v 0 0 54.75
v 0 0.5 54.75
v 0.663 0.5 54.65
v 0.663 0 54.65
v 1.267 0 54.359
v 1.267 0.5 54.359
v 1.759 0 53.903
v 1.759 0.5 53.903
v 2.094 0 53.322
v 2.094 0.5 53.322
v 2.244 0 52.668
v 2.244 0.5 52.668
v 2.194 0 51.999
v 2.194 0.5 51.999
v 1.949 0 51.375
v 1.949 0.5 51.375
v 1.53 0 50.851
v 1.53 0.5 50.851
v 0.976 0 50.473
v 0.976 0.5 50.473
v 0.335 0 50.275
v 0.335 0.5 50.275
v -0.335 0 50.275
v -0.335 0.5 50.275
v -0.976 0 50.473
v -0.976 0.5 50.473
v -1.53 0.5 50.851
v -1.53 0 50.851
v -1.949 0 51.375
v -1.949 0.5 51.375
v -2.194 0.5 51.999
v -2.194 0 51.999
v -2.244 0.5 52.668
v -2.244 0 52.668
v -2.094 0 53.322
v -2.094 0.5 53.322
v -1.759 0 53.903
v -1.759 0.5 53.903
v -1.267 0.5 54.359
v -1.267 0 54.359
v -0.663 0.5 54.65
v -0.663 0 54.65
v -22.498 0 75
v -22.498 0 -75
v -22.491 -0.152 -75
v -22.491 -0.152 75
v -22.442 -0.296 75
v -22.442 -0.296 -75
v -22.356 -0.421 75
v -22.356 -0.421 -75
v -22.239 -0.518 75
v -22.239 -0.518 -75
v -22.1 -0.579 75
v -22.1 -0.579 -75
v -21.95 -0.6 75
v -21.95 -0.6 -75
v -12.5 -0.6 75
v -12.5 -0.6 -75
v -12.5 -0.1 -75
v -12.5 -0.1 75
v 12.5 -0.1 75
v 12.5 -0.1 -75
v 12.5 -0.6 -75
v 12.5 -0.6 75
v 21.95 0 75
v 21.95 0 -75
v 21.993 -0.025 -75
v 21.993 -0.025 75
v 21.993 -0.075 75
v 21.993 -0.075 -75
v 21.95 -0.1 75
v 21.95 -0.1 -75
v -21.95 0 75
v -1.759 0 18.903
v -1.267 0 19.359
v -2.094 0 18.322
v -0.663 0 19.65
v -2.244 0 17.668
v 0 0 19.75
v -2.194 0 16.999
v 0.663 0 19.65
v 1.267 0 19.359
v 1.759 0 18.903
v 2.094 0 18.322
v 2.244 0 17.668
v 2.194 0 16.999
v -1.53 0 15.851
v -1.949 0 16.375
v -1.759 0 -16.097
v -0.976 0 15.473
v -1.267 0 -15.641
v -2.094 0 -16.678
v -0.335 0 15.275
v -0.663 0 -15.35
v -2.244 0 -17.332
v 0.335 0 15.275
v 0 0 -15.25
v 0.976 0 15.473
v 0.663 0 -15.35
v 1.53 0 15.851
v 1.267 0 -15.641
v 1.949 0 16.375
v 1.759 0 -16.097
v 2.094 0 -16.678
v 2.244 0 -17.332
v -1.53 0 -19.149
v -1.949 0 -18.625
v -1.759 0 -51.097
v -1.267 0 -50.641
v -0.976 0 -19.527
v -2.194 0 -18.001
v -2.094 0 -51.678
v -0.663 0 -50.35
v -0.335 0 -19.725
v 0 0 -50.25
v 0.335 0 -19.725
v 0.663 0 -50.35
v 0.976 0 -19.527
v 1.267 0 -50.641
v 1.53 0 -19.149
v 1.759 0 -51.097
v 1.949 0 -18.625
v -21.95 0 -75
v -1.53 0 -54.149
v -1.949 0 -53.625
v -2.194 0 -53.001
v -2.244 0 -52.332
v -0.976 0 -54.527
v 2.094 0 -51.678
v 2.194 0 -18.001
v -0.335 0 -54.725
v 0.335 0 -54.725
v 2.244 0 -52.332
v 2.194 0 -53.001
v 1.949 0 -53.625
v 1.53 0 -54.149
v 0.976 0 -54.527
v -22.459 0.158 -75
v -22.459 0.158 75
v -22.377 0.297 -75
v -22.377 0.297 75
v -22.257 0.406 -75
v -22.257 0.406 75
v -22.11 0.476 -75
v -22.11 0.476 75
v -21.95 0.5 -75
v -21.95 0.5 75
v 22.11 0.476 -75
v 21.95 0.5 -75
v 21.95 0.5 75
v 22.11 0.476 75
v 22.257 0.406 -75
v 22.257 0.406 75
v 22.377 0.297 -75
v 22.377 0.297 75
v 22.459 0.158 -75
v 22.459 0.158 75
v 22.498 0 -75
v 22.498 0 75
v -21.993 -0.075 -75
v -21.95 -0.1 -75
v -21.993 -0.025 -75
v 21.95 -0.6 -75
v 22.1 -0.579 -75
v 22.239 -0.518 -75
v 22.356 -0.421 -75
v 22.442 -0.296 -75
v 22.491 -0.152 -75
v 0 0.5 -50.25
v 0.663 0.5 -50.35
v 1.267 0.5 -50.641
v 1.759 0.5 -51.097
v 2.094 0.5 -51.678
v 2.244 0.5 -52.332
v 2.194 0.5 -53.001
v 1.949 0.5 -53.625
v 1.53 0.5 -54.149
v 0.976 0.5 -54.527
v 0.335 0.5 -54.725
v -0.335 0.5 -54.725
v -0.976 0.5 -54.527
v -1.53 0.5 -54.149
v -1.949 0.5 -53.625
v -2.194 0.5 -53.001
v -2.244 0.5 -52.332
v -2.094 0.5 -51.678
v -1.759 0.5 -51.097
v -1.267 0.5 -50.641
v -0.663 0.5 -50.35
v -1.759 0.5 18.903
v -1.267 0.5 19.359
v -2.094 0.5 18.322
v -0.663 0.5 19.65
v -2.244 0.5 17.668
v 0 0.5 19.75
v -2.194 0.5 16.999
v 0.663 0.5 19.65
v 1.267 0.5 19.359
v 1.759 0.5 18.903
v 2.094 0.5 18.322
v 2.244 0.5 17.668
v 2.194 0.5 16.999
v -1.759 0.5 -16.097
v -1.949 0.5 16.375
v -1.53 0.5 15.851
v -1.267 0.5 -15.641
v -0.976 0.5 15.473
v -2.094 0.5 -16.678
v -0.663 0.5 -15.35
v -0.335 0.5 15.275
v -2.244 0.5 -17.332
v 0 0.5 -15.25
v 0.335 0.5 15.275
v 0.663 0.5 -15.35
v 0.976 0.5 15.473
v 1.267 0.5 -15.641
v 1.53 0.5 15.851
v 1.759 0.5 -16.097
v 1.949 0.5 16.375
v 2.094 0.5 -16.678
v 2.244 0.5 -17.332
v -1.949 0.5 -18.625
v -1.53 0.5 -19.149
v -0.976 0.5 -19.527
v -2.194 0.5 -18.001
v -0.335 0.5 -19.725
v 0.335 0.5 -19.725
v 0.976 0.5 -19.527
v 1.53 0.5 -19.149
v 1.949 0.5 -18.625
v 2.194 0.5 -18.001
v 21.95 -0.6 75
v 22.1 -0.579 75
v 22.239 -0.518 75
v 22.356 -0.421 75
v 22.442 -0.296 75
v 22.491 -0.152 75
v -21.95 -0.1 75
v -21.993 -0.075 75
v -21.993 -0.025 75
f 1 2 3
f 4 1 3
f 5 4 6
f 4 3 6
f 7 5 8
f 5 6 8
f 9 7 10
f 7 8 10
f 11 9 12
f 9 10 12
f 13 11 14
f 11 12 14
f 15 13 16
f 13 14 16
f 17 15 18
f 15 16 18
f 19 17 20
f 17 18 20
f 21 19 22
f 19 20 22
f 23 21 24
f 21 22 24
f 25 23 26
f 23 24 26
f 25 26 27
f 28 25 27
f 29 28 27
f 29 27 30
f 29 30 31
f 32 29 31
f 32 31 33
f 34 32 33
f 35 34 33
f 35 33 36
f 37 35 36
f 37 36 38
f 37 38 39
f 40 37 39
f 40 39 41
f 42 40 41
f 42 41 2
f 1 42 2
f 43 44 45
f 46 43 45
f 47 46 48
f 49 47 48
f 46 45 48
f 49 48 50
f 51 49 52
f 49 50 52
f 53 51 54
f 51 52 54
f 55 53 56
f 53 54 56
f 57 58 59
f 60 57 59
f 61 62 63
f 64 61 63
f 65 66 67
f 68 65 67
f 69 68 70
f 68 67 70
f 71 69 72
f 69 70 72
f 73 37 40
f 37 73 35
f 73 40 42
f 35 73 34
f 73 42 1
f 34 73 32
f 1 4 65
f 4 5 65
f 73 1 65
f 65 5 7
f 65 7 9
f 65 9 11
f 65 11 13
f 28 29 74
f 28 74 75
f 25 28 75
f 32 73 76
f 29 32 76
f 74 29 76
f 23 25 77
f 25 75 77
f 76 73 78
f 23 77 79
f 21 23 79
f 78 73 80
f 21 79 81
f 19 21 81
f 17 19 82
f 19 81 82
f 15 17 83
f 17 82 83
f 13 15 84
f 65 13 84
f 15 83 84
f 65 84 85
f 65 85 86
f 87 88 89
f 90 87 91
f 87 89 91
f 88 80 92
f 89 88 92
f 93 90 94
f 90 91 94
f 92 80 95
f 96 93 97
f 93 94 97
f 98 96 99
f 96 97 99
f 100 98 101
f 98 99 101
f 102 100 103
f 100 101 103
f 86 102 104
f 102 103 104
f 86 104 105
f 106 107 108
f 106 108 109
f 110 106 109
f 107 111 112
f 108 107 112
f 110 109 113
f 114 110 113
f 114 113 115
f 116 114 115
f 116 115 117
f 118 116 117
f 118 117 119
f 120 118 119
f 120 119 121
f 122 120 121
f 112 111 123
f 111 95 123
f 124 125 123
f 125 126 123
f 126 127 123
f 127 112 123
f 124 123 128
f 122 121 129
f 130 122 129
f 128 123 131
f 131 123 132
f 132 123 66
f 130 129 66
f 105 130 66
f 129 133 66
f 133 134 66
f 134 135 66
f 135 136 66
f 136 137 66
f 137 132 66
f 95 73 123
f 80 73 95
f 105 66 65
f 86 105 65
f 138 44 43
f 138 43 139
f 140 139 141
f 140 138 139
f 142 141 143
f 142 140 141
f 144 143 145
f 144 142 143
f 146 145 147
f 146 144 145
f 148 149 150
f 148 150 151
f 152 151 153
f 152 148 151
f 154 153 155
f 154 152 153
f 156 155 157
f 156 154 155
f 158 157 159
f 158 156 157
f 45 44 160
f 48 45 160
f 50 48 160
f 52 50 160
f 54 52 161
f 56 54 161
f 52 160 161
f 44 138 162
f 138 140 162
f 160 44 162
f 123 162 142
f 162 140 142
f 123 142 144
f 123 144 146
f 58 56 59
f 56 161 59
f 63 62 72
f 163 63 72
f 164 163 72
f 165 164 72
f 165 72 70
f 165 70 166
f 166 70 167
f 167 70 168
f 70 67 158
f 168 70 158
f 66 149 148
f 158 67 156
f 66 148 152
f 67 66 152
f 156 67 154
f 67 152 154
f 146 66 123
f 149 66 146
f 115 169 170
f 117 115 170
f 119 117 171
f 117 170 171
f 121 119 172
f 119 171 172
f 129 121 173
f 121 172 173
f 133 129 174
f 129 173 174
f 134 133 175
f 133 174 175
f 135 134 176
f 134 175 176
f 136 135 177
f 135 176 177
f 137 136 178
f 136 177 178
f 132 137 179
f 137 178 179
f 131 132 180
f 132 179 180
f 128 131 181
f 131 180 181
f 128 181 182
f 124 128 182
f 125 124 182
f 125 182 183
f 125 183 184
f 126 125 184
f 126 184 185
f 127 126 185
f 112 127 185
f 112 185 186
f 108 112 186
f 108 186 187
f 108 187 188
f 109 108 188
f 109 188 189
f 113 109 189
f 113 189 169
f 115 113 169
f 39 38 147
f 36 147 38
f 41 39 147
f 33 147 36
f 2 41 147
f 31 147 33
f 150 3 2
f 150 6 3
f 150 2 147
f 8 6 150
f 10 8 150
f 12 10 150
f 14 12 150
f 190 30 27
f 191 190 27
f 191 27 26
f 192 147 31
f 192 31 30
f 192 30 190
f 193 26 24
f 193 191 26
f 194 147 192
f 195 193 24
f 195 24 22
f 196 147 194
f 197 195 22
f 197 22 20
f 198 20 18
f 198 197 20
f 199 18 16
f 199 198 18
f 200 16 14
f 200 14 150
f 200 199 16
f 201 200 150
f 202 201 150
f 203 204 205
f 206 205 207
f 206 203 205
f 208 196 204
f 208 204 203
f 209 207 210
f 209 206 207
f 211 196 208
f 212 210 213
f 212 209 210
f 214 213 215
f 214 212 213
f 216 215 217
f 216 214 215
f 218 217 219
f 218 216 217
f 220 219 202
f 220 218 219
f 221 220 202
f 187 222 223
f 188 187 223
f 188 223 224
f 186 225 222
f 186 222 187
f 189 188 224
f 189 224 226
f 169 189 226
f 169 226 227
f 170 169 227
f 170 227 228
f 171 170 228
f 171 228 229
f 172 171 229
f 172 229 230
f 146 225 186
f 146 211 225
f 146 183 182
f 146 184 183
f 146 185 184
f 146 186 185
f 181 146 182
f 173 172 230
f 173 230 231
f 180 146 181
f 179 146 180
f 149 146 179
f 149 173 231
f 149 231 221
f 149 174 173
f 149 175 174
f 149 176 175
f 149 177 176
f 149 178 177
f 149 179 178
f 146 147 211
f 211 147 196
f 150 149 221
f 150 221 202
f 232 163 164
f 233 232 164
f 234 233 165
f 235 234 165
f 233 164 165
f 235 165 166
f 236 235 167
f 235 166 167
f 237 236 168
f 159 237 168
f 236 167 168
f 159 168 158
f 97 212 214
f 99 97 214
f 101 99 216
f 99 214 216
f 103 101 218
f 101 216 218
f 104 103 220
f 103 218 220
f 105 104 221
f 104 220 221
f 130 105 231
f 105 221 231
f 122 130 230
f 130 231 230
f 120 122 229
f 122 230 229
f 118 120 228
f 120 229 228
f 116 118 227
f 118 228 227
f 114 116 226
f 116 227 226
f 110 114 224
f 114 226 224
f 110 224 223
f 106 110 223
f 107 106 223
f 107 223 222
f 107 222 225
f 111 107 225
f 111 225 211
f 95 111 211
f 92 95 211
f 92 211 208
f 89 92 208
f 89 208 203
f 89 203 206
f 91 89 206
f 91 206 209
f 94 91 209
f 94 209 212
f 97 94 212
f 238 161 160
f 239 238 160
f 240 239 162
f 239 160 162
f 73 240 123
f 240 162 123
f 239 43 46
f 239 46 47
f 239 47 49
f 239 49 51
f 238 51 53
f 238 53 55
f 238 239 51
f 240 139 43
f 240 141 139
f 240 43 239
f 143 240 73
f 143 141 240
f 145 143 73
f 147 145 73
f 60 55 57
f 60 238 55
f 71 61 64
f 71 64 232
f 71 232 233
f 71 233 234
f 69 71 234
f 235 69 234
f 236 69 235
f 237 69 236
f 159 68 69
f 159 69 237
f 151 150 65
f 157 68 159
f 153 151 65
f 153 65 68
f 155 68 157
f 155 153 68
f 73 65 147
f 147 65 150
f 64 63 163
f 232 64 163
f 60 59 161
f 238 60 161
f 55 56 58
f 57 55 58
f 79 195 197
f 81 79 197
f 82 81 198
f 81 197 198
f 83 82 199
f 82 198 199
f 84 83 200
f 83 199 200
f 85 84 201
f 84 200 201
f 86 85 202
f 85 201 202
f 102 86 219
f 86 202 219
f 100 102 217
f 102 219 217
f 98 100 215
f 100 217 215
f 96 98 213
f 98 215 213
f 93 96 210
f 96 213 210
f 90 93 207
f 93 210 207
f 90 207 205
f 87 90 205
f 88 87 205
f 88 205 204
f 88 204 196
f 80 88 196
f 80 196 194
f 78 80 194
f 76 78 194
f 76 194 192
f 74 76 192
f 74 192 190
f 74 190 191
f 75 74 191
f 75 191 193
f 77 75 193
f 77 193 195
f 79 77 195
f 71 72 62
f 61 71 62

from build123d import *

# Parameters (mm, degrees)
SKETCH1_W           = 45
SKETCH1_H           = 150
BOSS_EXTRUDE1_DEPTH = 0.5
SKETCH2_R           = 2.25
CUT_EXTRUDE1_DEPTH  = 10.5
HEM1_START          = -75
HEM1_DEPTH          = 150
HEM1_2_DEPTH        = 150


# Read off the part's stored shape, not the designer's step: Hem1
with BuildPart() as part:
    # Sketch1 → Boss-Extrude1 (new body)
    with BuildSketch(Plane(origin=(0, 0, 0), x_dir=(1, 0, 0), z_dir=(0, 1, 0))):
        Rectangle(SKETCH1_W, SKETCH1_H)
    extrude(amount=BOSS_EXTRUDE1_DEPTH)

    # Sketch2 → Cut-Extrude1 (cut)
    with BuildSketch(Plane(origin=(0, 0.5, 0), x_dir=(1, 0, 0), z_dir=(0, 1, 0))):
        with Locations(Location((0, 52.5, 0), (0, 0, 270))):
            Circle(SKETCH2_R)
        with Locations(Location((0, 17.5, 0), (0, 0, 270))):
            Circle(SKETCH2_R)
        with Locations(Location((0, -17.5, 0), (0, 0, 270))):
            Circle(SKETCH2_R)
        with Locations(Location((0, -52.5, 0), (0, 0, 270))):
            Circle(SKETCH2_R)
    extrude(amount=-CUT_EXTRUDE1_DEPTH, mode=Mode.SUBTRACT)

    # Hem1 outline → Hem1 (cut)
    with BuildSketch(Plane.XY.offset(HEM1_START)):
        with BuildLine():
            ThreePointArc((21.95, 0.5), (22.320809924, 0.35620192), (22.497722558, 0))
            Line((22.497722558, 0), (22.5, 0))
            Line((22.5, 0), (22.5, 0.5))
            Line((22.5, 0.5), (21.95, 0.5))
        make_face()
        with BuildLine():
            ThreePointArc((-22.497722558, 0), (-22.320809924, 0.35620192), (-21.95, 0.5))
            Line((-21.95, 0.5), (-22.5, 0.5))
            Line((-22.5, 0.5), (-22.5, 0))
            Line((-22.5, 0), (-22.497722558, 0))
        make_face()
    extrude(amount=HEM1_DEPTH, mode=Mode.SUBTRACT)

    # Hem1 2 outline → Hem1 2 (add)
    with BuildSketch(Plane.XY.offset(HEM1_START)):
        with BuildLine():
            Line((12.5, -0.1), (12.5, -0.6))
            Line((12.5, -0.6), (21.95, -0.6))
            ThreePointArc((21.95, -0.6), (22.35620192, -0.420809924), (22.497722558, 0))
            Line((22.497722558, 0), (21.95, 0))
            ThreePointArc((21.95, 0), (22, -0.05), (21.95, -0.1))
            Line((21.95, -0.1), (12.5, -0.1))
        make_face()
        with BuildLine():
            ThreePointArc((-21.95, -0.1), (-22, -0.05), (-21.95, 0))
            Line((-21.95, 0), (-22.497722558, 0))
            ThreePointArc((-22.497722558, 0), (-22.35620192, -0.420809924), (-21.95, -0.6))
            Line((-21.95, -0.6), (-12.5, -0.6))
            Line((-12.5, -0.6), (-12.5, -0.1))
            Line((-12.5, -0.1), (-21.95, -0.1))
        make_face()
    extrude(amount=HEM1_2_DEPTH)


solid = part.part
